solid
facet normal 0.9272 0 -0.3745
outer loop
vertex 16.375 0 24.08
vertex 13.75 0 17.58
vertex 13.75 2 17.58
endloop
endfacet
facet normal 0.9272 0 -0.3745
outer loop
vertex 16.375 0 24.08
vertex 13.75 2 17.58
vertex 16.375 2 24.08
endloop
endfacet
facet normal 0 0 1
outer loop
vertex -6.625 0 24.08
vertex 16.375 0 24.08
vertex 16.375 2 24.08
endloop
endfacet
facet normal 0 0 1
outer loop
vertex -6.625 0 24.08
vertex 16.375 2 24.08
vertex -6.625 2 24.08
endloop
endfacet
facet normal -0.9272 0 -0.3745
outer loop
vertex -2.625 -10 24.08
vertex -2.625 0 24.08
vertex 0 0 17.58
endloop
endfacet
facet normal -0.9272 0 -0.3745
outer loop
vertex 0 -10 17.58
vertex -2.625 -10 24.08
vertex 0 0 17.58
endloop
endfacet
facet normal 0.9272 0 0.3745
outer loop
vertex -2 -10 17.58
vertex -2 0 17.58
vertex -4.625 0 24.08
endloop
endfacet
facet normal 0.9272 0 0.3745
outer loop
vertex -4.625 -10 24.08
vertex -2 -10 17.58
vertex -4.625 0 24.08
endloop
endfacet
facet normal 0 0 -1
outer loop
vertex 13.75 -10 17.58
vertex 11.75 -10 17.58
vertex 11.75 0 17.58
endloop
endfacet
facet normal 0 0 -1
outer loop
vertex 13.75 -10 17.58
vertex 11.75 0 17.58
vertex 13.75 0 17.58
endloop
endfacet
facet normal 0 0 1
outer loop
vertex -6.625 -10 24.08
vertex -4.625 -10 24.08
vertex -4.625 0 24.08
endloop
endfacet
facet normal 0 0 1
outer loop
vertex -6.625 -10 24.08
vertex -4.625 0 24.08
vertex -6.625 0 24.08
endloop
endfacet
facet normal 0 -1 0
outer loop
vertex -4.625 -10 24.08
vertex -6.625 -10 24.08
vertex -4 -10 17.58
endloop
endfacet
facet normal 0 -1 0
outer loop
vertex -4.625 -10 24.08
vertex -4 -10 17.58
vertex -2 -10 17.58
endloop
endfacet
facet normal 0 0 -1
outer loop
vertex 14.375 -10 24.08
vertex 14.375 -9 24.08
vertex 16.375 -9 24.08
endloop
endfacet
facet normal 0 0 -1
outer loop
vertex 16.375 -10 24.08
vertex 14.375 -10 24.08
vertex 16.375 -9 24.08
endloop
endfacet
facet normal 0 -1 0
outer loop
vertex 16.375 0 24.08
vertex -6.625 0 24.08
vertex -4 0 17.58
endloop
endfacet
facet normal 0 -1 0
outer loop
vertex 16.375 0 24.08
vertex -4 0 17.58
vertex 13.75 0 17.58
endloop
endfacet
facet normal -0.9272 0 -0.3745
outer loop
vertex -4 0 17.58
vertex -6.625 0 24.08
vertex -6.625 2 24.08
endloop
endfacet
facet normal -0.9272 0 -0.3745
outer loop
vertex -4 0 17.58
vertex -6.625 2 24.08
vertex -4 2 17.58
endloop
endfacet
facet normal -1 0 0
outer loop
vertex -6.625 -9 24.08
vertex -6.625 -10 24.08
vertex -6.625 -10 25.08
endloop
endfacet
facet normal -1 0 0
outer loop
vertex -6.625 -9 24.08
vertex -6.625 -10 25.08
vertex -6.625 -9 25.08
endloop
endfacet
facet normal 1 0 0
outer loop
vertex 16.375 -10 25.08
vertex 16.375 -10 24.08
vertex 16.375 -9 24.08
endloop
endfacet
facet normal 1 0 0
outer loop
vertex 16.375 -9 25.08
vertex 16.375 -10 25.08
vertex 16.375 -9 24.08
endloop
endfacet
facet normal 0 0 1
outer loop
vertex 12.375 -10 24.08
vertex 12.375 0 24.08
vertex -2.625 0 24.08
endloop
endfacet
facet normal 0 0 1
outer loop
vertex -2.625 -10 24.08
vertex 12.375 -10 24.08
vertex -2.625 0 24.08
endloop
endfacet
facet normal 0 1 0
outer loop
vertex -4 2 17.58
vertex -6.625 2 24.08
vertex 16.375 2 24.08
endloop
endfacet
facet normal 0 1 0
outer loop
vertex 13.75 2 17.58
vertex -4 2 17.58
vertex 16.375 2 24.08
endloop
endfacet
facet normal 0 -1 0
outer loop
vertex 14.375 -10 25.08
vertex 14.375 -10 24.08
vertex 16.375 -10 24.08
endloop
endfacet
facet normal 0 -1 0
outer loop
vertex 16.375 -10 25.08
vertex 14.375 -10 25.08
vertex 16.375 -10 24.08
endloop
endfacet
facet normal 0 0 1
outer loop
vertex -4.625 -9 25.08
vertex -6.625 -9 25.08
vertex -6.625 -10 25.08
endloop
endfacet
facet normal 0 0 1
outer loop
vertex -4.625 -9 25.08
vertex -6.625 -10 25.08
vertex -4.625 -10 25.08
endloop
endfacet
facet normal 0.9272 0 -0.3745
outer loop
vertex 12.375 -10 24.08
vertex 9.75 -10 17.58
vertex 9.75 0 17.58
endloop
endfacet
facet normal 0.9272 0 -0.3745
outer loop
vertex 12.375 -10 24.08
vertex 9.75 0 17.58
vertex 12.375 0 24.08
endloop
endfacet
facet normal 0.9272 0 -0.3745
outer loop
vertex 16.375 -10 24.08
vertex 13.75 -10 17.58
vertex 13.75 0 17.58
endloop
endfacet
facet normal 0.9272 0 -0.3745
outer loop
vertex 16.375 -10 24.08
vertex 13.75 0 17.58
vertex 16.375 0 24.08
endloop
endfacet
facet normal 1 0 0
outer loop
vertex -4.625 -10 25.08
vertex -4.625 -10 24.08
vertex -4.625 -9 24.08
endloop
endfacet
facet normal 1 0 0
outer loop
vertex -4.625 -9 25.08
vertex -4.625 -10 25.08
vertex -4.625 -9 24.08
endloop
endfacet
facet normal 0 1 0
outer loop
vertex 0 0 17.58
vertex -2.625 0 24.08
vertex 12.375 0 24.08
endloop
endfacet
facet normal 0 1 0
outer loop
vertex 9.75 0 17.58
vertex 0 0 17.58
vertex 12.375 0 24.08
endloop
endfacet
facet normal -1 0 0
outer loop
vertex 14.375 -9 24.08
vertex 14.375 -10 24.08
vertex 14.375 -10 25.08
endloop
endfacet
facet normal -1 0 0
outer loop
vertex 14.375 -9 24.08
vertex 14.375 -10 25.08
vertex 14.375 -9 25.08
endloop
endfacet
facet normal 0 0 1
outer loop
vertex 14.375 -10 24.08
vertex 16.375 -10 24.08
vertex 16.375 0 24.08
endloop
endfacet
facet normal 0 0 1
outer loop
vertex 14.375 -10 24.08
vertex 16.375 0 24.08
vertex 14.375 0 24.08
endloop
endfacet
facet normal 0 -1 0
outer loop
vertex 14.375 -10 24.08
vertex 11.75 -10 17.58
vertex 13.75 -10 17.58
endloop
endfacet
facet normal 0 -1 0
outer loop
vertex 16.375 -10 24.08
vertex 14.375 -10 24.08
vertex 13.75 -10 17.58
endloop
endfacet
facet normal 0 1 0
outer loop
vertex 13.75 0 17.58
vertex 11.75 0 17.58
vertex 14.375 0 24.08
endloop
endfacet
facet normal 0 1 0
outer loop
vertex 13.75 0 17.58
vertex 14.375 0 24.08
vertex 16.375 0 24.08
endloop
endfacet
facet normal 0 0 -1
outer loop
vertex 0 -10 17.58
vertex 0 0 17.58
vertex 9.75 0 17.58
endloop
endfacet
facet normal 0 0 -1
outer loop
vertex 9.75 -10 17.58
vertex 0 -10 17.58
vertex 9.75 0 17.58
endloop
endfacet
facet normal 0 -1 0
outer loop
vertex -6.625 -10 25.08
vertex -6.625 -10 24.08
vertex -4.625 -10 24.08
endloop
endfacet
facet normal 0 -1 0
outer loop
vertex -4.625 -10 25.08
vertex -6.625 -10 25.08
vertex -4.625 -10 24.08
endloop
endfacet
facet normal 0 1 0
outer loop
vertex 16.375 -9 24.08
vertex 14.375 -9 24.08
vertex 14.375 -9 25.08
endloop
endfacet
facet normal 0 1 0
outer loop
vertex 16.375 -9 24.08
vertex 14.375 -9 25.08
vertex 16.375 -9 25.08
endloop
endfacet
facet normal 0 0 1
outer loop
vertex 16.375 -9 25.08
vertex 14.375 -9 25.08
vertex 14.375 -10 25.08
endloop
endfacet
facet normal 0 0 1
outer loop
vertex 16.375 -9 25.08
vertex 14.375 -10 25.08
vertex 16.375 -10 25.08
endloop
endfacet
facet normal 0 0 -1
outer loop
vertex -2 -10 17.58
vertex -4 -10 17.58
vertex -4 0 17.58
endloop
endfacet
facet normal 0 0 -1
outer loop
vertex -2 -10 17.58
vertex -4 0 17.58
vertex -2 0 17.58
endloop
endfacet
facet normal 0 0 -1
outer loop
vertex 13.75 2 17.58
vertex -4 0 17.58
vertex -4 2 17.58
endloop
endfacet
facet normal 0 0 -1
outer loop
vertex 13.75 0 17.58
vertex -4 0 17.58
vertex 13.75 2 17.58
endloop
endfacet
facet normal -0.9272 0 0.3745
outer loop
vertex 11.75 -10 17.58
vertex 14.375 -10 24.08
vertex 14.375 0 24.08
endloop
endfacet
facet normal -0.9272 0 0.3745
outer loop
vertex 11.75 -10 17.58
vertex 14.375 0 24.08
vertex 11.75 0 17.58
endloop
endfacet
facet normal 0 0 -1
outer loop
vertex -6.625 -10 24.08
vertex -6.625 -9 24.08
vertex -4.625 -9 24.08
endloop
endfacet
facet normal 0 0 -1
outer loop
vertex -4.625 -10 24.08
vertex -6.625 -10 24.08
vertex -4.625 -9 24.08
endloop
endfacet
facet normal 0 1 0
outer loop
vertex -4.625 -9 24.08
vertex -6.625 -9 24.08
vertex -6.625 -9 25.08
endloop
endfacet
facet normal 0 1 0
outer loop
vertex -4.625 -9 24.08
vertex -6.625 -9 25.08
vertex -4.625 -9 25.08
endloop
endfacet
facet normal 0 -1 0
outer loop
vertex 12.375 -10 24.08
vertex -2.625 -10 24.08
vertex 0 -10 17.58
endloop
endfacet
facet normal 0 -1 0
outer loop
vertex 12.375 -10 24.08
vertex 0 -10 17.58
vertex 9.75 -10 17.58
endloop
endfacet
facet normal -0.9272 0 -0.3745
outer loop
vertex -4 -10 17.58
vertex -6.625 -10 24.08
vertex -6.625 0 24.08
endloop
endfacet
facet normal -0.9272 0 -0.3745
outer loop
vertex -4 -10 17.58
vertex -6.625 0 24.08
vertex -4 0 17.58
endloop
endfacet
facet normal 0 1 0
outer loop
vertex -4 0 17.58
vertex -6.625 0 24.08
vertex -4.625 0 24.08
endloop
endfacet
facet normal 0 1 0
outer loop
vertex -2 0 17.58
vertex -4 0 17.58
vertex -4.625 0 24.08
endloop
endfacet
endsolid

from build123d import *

# Parameters (mm, degrees)
F1_DEPTH = 10
F2_DEPTH = 2
F3_W     = 2
F3_H     = 1
F4_DEPTH = 1


with BuildPart() as f1:
    # F0 (on Front) → F1 (new body)
    with BuildSketch(Plane.XZ):
        Polygon((12.375, 24.080159), (-2.625, 24.080159), (0, 17.580159), (9.75, 17.580159), align=None)
        Polygon((-2, 17.580159), (-4.625, 24.080159), (-6.625, 24.080159), (-4, 17.580159), align=None)
        Polygon((16.375, 24.080159), (14.375, 24.080159), (11.75, 17.580159), (13.75, 17.580159), align=None)
    extrude(amount=F1_DEPTH)


with BuildPart() as f2:
    # F0 (on Front) → F2 (new body)
    with BuildSketch(Plane.XZ):
        Polygon((-2, 17.580159), (-4.625, 24.080159), (-6.625, 24.080159), (-4, 17.580159), align=None)
        Polygon((0, 17.580159), (-2.625, 24.080159), (-4.625, 24.080159), (-2, 17.580159), align=None)
        Polygon((12.375, 24.080159), (-2.625, 24.080159), (0, 17.580159), (9.75, 17.580159), align=None)
        Polygon((14.375, 24.080159), (12.375, 24.080159), (9.75, 17.580159), (11.75, 17.580159), align=None)
        Polygon((16.375, 24.080159), (14.375, 24.080159), (11.75, 17.580159), (13.75, 17.580159), align=None)
    extrude(amount=-F2_DEPTH)


with BuildPart() as f4:
    # F3 (on face) → F4 (new body)
    with BuildSketch(Plane.XY.offset(24.080159)):
        with Locations((-5.625, -9.5)):
            Rectangle(F3_W, F3_H)
        with Locations((15.375, -9.5)):
            Rectangle(F3_W, F3_H)
    extrude(amount=F4_DEPTH)


solid = Compound([f1.part, f2.part, f4.part])
